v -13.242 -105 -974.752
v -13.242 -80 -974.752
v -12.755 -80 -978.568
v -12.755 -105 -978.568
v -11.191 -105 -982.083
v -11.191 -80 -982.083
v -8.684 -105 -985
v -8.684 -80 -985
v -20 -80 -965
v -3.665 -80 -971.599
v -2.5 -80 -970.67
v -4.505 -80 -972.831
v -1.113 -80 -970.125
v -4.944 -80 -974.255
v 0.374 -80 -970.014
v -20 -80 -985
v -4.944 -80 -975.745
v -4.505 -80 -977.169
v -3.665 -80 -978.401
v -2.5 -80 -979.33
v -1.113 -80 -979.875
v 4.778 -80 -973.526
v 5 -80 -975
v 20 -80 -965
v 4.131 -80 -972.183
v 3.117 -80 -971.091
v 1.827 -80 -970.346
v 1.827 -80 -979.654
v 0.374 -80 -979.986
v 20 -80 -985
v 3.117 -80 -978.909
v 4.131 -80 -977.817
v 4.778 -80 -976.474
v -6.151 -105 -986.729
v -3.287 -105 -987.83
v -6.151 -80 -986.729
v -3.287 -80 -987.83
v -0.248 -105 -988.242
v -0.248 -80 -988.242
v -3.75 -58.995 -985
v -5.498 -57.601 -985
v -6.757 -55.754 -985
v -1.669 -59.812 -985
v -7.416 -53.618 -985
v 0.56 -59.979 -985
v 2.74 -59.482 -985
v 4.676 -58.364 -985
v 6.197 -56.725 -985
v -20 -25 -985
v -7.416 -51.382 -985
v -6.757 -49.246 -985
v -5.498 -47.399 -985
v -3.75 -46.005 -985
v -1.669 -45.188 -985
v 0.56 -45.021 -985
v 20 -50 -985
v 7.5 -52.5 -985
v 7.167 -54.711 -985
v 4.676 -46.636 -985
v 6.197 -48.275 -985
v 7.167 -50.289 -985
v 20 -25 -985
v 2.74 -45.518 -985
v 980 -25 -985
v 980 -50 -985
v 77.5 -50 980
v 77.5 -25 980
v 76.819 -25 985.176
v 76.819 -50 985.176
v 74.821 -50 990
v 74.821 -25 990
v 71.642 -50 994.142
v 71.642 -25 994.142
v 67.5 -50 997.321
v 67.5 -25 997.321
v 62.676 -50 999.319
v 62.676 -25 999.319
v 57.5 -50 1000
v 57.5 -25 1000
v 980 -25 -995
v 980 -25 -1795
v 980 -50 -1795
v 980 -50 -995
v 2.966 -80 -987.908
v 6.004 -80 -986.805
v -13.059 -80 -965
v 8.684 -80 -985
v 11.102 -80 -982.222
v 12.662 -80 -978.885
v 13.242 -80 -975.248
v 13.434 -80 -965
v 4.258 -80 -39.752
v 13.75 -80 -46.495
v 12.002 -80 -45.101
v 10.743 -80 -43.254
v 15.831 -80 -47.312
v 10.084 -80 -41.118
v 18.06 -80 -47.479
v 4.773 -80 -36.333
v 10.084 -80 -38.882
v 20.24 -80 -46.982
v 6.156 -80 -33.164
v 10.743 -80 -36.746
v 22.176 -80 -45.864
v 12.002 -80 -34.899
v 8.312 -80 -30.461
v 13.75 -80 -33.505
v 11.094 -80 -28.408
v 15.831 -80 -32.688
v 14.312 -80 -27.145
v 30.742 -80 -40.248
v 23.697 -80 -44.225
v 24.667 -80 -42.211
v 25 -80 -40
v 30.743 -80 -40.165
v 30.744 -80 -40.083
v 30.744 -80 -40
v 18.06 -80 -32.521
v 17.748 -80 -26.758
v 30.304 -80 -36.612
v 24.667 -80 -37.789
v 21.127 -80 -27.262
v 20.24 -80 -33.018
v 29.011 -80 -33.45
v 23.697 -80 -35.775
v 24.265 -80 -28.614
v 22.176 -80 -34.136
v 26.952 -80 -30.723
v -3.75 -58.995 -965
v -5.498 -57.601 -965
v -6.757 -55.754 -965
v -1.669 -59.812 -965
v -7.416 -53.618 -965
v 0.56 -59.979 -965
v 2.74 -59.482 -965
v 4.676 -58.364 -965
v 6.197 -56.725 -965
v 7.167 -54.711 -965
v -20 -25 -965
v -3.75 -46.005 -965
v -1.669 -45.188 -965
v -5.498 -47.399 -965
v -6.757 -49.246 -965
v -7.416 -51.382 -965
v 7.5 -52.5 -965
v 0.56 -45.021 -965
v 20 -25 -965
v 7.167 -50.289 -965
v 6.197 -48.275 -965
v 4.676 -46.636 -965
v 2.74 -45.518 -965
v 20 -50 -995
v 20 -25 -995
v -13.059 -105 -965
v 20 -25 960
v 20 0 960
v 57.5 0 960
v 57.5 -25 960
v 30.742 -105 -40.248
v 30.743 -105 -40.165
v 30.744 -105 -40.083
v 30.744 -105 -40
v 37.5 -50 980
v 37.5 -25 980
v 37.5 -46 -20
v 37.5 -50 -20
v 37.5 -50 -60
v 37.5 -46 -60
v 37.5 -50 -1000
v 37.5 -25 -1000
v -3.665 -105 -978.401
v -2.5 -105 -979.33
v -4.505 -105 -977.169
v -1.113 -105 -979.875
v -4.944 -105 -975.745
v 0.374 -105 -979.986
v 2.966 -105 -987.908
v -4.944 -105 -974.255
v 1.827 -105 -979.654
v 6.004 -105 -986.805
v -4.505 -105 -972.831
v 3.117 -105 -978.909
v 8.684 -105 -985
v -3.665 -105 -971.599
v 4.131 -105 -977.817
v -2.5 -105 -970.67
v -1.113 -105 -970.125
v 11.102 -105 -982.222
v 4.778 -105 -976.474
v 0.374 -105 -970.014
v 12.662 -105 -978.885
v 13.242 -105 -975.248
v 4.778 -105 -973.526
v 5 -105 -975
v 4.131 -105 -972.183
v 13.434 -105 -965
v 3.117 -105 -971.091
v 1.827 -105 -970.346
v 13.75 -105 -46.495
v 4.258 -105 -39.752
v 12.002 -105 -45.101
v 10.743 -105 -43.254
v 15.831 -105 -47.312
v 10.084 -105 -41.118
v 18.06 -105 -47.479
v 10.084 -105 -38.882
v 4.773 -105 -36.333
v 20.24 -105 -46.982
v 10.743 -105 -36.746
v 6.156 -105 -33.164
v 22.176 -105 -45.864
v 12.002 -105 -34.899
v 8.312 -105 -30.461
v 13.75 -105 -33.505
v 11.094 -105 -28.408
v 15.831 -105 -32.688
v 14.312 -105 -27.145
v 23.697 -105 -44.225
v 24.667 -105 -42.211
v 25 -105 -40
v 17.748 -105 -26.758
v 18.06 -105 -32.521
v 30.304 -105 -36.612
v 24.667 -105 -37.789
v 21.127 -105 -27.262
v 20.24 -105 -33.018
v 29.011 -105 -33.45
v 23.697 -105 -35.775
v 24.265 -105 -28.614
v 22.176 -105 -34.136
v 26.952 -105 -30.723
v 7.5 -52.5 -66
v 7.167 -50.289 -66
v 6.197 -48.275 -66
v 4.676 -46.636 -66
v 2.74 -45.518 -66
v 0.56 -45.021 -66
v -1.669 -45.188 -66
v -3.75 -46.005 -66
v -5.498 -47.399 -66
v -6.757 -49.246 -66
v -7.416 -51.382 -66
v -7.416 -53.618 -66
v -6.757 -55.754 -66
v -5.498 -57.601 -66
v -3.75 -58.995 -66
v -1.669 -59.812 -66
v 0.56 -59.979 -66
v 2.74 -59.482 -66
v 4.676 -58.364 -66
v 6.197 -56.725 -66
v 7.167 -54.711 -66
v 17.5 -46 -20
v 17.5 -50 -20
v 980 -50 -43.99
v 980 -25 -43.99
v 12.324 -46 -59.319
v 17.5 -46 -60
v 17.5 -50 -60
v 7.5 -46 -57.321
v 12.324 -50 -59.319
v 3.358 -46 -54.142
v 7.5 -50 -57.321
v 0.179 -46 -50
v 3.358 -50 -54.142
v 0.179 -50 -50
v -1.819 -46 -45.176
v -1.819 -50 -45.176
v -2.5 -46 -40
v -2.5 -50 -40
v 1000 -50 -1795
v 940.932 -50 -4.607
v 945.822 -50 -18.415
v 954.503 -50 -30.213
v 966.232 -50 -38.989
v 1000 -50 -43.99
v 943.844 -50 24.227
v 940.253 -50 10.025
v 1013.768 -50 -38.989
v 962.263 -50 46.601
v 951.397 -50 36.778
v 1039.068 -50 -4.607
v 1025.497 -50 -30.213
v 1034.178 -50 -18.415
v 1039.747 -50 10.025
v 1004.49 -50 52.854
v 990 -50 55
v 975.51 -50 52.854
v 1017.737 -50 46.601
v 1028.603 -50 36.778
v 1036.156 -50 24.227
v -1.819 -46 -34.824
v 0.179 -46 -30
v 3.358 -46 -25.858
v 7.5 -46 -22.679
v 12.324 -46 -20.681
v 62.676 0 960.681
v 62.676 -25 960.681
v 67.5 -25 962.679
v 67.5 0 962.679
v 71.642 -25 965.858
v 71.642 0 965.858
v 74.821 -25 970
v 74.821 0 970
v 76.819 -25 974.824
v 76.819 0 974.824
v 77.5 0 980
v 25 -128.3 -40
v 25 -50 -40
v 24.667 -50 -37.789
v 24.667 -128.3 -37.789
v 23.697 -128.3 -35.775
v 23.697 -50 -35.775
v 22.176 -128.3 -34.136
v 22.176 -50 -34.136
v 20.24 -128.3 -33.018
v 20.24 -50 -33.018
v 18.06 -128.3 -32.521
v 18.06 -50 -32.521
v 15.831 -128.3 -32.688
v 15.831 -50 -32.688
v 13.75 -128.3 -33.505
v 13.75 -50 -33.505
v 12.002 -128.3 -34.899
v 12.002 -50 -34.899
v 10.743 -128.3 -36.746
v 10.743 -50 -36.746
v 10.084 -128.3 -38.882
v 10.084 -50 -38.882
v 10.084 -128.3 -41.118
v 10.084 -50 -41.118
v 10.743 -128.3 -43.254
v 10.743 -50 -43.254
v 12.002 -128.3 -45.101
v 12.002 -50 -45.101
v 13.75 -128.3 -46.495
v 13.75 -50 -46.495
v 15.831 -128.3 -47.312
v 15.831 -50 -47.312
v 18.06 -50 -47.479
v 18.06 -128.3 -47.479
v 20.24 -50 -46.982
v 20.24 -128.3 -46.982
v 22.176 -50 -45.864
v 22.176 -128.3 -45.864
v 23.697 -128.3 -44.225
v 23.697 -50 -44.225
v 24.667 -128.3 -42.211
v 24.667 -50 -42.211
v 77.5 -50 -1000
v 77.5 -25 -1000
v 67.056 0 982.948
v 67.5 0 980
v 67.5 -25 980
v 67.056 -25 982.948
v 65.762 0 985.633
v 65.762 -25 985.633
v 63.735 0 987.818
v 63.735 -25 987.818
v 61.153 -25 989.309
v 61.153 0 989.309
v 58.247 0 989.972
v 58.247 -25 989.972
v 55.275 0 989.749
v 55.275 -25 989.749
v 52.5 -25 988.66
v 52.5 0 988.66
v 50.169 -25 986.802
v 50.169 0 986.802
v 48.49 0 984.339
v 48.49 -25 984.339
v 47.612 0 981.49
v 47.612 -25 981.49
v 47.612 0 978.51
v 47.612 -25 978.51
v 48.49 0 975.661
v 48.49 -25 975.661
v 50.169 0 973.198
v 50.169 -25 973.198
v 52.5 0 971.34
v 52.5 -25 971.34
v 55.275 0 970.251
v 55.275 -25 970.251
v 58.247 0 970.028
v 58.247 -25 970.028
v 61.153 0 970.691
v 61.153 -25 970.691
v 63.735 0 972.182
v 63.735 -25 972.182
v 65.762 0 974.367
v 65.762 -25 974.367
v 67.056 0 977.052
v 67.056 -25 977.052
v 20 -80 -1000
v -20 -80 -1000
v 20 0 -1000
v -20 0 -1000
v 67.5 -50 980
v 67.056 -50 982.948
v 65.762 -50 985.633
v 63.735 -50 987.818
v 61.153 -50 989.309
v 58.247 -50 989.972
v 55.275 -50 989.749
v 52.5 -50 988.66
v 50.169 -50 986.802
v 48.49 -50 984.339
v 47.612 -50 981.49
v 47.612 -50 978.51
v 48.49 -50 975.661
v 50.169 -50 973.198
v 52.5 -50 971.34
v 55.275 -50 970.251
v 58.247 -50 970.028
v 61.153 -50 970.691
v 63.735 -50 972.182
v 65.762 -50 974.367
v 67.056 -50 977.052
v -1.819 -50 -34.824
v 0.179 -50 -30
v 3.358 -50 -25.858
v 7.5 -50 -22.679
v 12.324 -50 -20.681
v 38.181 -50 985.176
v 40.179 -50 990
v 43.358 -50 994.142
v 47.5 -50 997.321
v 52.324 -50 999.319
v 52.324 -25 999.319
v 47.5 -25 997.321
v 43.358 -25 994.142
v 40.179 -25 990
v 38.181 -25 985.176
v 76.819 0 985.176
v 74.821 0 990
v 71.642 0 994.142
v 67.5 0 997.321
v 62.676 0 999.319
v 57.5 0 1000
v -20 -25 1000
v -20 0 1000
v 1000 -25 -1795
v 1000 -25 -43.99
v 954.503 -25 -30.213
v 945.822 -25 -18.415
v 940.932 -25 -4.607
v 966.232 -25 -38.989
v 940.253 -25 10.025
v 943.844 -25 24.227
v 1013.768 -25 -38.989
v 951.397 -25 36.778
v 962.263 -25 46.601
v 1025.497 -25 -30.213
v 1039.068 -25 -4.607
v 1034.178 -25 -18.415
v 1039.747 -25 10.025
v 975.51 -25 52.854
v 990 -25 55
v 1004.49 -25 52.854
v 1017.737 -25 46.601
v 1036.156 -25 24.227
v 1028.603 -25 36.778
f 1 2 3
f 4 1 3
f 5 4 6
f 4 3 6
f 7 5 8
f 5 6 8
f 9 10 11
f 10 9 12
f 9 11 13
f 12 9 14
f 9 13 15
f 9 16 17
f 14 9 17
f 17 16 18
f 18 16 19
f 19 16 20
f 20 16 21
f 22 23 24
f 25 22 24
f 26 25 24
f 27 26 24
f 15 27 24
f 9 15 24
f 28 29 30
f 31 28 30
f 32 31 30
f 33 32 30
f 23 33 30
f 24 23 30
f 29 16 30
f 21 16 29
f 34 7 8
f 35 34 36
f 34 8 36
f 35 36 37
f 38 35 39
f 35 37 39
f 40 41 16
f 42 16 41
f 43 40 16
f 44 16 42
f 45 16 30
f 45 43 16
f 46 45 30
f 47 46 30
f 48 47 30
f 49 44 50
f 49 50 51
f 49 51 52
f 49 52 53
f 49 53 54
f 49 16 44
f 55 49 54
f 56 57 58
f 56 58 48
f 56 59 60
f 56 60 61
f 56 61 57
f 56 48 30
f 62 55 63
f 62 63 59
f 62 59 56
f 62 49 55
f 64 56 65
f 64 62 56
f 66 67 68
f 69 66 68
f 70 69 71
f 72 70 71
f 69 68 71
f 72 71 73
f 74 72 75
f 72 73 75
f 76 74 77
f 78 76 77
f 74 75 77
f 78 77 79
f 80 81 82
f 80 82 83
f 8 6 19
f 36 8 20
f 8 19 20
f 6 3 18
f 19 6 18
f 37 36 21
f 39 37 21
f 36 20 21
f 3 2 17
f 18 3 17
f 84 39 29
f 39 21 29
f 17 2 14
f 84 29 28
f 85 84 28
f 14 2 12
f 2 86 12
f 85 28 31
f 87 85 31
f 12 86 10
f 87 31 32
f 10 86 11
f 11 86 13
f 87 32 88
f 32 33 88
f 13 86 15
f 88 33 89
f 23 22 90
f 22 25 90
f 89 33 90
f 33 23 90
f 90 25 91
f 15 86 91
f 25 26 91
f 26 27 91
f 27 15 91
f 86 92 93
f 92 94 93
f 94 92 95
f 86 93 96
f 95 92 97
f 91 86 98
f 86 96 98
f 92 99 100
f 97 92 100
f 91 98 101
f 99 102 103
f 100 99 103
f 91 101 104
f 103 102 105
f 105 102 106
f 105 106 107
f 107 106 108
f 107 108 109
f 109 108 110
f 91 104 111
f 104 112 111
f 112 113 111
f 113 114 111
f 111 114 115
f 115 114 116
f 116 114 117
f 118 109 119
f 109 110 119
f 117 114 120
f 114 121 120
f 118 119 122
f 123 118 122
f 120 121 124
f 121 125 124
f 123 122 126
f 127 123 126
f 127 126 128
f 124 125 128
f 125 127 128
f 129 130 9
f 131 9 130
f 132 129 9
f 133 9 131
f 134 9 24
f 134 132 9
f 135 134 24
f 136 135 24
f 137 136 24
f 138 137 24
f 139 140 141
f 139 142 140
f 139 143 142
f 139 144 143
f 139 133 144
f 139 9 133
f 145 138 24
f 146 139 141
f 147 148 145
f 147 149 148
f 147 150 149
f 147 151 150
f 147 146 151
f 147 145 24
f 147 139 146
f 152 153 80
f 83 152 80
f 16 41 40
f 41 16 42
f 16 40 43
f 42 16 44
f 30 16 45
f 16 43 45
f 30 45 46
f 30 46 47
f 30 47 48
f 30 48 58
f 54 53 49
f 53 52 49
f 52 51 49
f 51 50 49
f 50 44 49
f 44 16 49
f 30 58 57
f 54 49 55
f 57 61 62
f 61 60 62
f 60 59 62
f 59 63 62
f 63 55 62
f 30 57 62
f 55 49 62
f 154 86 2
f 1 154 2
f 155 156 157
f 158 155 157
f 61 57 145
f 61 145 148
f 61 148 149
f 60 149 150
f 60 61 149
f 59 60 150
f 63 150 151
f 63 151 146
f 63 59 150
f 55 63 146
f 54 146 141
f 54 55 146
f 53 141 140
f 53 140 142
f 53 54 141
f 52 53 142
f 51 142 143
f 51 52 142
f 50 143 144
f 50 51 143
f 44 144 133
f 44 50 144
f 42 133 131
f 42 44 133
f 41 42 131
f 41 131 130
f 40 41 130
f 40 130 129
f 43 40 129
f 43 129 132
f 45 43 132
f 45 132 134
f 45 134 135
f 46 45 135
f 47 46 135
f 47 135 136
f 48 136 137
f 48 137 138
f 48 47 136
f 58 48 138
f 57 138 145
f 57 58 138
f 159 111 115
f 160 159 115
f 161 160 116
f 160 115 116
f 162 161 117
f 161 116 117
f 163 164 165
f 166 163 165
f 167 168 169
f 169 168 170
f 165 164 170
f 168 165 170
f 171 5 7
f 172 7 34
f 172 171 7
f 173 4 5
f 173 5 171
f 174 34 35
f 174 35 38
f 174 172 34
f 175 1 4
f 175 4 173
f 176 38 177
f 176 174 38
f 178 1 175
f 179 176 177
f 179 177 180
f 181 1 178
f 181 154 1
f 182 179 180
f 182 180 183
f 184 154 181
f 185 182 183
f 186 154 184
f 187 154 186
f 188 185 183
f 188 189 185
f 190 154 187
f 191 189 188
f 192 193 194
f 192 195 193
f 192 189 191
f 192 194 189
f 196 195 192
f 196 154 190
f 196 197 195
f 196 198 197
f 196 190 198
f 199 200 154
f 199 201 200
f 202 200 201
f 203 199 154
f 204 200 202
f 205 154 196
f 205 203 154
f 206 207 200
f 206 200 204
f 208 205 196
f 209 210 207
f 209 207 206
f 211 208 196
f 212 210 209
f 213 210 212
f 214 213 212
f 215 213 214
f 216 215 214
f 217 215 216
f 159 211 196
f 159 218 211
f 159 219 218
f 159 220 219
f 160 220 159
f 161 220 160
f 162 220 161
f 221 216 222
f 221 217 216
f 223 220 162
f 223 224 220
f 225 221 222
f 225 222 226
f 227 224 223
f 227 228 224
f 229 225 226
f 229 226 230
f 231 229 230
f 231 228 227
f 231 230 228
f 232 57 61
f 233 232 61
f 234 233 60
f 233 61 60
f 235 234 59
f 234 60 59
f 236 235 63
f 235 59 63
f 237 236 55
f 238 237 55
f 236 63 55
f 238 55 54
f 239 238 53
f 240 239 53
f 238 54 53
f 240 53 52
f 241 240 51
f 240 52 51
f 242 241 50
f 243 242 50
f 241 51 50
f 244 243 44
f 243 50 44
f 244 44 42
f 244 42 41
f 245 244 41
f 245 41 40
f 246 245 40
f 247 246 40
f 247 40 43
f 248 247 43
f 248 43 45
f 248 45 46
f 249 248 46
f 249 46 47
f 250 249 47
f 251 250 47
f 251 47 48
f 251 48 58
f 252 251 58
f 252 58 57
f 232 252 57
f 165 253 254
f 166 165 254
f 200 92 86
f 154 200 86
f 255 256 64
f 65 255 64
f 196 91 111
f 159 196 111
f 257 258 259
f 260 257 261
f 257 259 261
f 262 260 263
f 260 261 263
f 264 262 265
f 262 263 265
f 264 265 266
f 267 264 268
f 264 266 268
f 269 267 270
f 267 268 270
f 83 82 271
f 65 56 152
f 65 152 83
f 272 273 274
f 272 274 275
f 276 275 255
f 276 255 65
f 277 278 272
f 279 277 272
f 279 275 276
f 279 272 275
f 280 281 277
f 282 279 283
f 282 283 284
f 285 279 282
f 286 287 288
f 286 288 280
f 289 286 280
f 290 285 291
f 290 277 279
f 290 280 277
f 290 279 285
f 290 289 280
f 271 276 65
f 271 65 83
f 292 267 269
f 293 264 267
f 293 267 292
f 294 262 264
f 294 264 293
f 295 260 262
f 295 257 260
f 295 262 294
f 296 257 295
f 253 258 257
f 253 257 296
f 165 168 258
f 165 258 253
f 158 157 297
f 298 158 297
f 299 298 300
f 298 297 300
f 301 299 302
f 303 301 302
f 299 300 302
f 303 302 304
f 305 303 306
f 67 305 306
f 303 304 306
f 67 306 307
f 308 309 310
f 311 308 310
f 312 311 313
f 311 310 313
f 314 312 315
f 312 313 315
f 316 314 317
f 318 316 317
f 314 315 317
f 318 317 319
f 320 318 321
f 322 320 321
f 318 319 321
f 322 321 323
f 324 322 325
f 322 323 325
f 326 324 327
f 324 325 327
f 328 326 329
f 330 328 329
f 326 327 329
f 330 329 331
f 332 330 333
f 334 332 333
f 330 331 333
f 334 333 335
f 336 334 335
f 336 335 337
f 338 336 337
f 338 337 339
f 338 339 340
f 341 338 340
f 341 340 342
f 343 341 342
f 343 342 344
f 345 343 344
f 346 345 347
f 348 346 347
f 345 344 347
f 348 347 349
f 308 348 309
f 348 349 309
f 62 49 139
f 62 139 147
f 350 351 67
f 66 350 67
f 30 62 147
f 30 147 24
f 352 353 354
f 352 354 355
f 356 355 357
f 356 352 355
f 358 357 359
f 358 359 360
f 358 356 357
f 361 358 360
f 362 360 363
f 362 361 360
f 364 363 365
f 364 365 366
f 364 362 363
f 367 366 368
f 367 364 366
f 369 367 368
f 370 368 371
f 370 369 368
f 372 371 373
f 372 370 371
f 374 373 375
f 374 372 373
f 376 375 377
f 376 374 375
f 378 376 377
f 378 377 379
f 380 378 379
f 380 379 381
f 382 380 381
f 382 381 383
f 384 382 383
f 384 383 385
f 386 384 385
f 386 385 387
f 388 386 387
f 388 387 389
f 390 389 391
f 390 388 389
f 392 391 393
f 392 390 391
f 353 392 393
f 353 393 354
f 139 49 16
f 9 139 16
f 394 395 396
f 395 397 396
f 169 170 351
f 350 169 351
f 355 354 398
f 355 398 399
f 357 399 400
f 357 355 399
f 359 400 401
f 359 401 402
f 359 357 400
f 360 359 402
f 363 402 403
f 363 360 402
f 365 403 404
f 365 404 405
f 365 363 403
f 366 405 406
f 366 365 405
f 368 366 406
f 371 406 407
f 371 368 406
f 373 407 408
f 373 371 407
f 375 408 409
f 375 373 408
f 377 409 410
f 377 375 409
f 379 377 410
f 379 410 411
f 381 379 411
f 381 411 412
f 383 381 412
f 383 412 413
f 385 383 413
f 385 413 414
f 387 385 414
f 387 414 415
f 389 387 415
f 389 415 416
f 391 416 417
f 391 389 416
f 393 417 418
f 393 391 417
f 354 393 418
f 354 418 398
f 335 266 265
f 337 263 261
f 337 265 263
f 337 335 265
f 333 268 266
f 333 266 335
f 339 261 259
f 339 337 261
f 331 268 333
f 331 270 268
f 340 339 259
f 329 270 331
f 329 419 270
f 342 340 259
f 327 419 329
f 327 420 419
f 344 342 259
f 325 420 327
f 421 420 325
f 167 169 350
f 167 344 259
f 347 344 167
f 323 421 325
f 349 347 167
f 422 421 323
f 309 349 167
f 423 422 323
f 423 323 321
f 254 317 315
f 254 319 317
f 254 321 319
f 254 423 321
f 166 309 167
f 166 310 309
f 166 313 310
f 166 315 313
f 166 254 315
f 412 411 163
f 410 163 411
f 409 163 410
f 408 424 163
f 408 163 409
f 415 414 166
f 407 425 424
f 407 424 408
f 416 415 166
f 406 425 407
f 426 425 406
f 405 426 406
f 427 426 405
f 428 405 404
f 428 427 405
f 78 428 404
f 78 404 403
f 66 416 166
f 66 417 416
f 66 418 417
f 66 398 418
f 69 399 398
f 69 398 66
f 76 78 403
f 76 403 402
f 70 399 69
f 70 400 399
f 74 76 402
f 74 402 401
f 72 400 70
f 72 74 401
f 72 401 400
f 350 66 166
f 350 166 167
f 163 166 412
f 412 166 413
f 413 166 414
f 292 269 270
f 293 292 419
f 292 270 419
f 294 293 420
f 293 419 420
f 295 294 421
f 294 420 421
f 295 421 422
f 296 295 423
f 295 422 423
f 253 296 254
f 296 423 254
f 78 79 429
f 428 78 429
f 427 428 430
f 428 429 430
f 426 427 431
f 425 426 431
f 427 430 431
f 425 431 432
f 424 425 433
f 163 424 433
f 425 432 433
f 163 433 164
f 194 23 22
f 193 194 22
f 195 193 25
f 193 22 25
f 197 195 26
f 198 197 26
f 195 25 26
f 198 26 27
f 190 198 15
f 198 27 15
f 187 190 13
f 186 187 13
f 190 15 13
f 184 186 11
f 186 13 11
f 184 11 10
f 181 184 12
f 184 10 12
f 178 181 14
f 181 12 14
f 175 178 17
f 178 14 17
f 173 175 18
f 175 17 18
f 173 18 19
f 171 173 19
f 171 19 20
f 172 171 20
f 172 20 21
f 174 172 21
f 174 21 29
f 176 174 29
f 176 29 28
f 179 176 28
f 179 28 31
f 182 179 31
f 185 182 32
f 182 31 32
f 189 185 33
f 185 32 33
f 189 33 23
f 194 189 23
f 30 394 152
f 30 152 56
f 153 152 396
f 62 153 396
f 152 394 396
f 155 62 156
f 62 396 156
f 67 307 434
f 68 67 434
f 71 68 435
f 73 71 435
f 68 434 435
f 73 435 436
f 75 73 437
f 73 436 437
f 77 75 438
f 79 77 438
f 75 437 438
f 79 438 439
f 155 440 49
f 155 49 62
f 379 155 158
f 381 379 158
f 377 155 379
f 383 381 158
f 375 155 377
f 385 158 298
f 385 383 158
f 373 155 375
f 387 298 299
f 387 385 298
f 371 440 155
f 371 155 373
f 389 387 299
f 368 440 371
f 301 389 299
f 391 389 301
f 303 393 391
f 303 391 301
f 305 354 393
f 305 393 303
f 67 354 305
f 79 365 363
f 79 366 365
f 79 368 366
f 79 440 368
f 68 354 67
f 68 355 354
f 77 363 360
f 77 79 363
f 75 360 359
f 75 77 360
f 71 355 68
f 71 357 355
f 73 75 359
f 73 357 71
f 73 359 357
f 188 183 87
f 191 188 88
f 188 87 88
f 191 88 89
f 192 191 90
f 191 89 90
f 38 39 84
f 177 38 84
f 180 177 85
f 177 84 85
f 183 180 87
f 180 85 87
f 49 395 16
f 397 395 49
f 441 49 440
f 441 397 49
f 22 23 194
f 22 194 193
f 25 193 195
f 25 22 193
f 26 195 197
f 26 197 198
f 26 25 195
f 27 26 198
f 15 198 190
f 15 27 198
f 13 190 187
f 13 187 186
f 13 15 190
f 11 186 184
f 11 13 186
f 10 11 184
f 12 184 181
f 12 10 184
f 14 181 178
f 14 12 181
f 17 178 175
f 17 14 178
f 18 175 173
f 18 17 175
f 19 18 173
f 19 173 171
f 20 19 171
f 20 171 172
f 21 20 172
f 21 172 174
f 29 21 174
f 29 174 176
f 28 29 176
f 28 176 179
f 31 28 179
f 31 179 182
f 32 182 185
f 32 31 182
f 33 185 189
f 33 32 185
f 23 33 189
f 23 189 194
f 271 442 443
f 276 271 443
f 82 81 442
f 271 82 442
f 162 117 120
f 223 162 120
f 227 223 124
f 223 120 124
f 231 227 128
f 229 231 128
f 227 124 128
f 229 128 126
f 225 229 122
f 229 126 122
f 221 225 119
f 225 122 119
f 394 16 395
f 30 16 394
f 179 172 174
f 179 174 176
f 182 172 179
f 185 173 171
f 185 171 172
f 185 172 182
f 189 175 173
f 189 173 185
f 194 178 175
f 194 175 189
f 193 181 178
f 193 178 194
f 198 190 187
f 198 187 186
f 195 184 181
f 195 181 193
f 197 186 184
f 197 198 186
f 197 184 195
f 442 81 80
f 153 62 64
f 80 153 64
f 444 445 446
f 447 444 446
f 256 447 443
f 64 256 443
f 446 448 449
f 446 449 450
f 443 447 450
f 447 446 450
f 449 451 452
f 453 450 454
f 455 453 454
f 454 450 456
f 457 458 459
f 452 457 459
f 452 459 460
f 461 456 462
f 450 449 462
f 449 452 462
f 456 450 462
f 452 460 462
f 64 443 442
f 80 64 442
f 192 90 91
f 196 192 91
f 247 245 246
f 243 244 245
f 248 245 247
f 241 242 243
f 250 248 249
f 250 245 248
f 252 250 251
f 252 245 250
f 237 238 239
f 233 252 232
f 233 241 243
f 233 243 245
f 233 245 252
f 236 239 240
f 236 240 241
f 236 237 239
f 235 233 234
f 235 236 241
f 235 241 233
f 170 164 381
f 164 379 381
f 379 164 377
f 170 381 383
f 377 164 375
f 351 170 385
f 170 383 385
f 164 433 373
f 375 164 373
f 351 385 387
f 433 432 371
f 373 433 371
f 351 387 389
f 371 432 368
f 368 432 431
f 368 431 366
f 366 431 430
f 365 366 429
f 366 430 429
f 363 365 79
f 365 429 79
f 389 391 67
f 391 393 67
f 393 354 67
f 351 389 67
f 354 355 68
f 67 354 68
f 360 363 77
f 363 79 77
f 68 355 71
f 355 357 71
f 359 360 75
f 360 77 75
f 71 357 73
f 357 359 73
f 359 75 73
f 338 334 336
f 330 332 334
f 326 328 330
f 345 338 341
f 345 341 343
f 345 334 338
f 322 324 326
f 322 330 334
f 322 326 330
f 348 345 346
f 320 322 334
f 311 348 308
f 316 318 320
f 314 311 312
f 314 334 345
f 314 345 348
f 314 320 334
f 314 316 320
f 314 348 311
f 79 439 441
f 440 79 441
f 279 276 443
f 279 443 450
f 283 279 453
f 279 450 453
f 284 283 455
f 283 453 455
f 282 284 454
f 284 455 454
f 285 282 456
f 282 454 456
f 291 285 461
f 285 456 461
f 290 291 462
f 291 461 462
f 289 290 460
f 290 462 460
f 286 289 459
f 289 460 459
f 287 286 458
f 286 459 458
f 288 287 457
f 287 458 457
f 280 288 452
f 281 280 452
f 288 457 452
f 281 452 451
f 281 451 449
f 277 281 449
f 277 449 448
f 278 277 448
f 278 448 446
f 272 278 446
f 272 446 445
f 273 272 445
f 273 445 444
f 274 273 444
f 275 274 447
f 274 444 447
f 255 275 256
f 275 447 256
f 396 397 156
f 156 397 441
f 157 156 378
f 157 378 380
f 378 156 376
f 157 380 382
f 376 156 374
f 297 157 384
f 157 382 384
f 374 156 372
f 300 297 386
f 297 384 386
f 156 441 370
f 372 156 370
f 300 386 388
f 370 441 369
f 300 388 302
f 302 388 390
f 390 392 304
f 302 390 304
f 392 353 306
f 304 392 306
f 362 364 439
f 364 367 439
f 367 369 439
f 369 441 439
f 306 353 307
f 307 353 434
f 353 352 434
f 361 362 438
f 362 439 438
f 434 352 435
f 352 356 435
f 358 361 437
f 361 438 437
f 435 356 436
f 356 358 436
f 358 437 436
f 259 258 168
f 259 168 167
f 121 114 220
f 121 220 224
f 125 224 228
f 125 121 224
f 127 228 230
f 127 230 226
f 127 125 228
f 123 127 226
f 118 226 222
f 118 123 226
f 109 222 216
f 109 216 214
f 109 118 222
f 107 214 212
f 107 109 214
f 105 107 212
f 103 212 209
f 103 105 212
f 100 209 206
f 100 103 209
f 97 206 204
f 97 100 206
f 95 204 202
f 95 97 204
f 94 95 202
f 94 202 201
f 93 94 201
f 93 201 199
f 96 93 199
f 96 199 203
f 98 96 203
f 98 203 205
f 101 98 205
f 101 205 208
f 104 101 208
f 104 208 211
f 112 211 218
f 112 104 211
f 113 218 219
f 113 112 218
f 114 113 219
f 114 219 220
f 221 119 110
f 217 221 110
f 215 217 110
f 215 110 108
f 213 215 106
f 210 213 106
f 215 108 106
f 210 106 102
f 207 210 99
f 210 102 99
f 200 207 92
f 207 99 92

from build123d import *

# Parameters (mm, degrees)
F0_R      = 10
F1_DEPTH  = 25
F2_R      = 10
F3_DEPTH  = 25
F4_W      = 40
F4_H      = 15
F5_DEPTH  = 55
F6_W      = 4
F6_H      = 40
F7_DEPTH  = 40
F9_DEPTH  = 5
F10_R     = 7.5
F11_DEPTH = 919
F12_DEPTH = 20
F14_R     = 5
F14_R_2   = 7.5
F15_DEPTH = 25
F13_R     = 5
F16_DEPTH = 25
F8_R      = 7.5
F17_DEPTH = 78.3
F18_W     = 1000
F18_H     = 10
F18_W_2   = 20
F18_H_2   = 800
F19_DEPTH = 25


with BuildPart() as f1:
    # F0 (on Front) → F1 (new body)
    with BuildSketch(Plane.XZ):
        Polygon((20, 960), (20, 1000), (-20, 1000), (-20, -1000), (20, -1000), align=None)
        with BuildLine():
            Line((57.5, 1000), (20, 1000))
            Line((20, 1000), (20, 960))
            Line((20, 960), (57.5, 960))
            ThreePointArc((57.5, 960), (37.5, 980), (57.5, 1000))
        make_face()
        with BuildLine():
            ThreePointArc((77.5, 980), (71.6421356237, 994.1421356237), (57.5, 1000))
            ThreePointArc((57.5, 1000), (37.5, 980), (57.5, 960))
            ThreePointArc((57.5, 960), (71.6421356237, 965.8578643763), (77.5, 980))
        make_face()
        with Locations((57.5, 980)):
            Circle(F0_R, mode=Mode.SUBTRACT)
    extrude(amount=F1_DEPTH)

    # F4 (on face) → F5 (join)
    with BuildSketch(Plane.XZ.offset(25)):
        with Locations((0, -992.5)):
            Rectangle(F4_W, F4_H)
    extrude(amount=F5_DEPTH)

    # F10 (on face) → F11 (join)
    with BuildSketch(Plane.XY.offset(-985)):
        with Locations((0, -52.5)):
            Circle(F10_R)
    extrude(amount=F11_DEPTH)


with BuildPart() as f3:
    # F2 (on face) → F3 (new body)
    with BuildSketch(Plane.XZ.offset(25)):
        with BuildLine():
            Line((77.5, -1000), (77.5, 980))
            ThreePointArc((77.5, 980), (71.6421356237, 965.8578643763), (57.5, 960))
            Line((57.5, 960), (37.5, 960))
            Line((37.5, 960), (37.5, -1000))
            Line((37.5, -1000), (77.5, -1000))
        make_face()
        with BuildLine():
            ThreePointArc((77.5, 980), (71.6421356237, 994.1421356237), (57.5, 1000))
            ThreePointArc((57.5, 1000), (43.3578643763, 994.1421356237), (37.5, 980))
            ThreePointArc((37.5, 980), (43.3578643763, 965.8578643763), (57.5, 960))
            ThreePointArc((57.5, 960), (71.6421356237, 965.8578643763), (77.5, 980))
        make_face()
        with Locations((57.5, 980)):
            Circle(F2_R, mode=Mode.SUBTRACT)
        with BuildLine():
            ThreePointArc((57.5, 960), (43.3578643763, 965.8578643763), (37.5, 980))
            Line((37.5, 980), (37.5, 960))
            Line((37.5, 960), (57.5, 960))
        make_face()
    extrude(amount=F3_DEPTH)

    # F6 (on face) → F7 (join)
    with BuildSketch(Plane(origin=(37.5, 0, 0), x_dir=(0, -1, 0), z_dir=(-1, 0, 0))):
        with Locations((48, -40)):
            Rectangle(F6_W, F6_H)
    extrude(amount=F7_DEPTH)

    # F8 (on face) → F9 (cut)
    with BuildSketch(Plane.XZ.offset(50)):
        with BuildLine():
            ThreePointArc((-2.5, -40), (3.3578643763, -25.8578643763), (17.5, -20))
            Line((17.5, -20), (-2.5, -20))
            Line((-2.5, -20), (-2.5, -40))
        make_face()
        with BuildLine():
            Line((-2.5, -60), (17.5, -60))
            ThreePointArc((17.5, -60), (3.3578643763, -54.1421356237), (-2.5, -40))
            Line((-2.5, -40), (-2.5, -60))
        make_face()
    extrude(amount=-F9_DEPTH, mode=Mode.SUBTRACT)

    # F8 (on face) → F17 (join)
    with BuildSketch(Plane.XZ.offset(50)):
        with Locations((17.5, -40)):
            Circle(F8_R)
    extrude(amount=F17_DEPTH)


with BuildPart() as f12:
    # F12 (new): a face of the model
    f12_faces = [f1.part.faces().sort_by_distance(p)[0] for p in [
        (19.3199264746, -52.5, -985),
    ]]
    extrude(f12_faces, amount=F12_DEPTH)

    # F13 (on face) → F16 (join)
    with BuildSketch(Plane.XZ.offset(80)):
        with Locations((0, -975)):
            Circle(F13_R)
    extrude(amount=F16_DEPTH)


with BuildPart() as f15:
    # F14 (on face) → F15 (new body)
    with BuildSketch(Plane.XZ.offset(80)):
        with BuildLine():
            Line((-8.6838635851, -965), (8.6838635851, -965))
            ThreePointArc((8.6838635851, -965), (0, -961.755775343), (-8.6838635851, -965))
        make_face()
        with BuildLine():
            Line((13.2419054738, -975.2478430705), (13.4337100232, -965))
            Line((13.4337100232, -965), (8.6838635851, -965))
            ThreePointArc((8.6838635851, -965), (12.0503221321, -969.5046180045), (13.244224657, -975))
            ThreePointArc((13.244224657, -975), (13.2436448485, -975.1239269605), (13.2419054738, -975.2478430705))
        make_face()
        with BuildLine():
            Line((-8.6838635851, -965), (-13.0593784724, -965))
            Line((-13.0593784724, -965), (-13.2419052476, -974.7521448442))
            ThreePointArc((-13.2419052476, -974.7521448442), (-11.9983714308, -969.3920975603), (-8.6838635851, -965))
        make_face()
        with BuildLine():
            ThreePointArc((-0.2478435243, -988.2419054653), (4.5187494263, -987.4495136606), (8.6838635851, -985))
            Line((8.6838635851, -985), (-8.6838635851, -985))
            ThreePointArc((-8.6838635851, -985), (-4.7509299861, -987.3627727889), (-0.2478435243, -988.2419054653))
        make_face()
        with BuildLine():
            Line((13.4337100232, -965), (30.7419054788, -40.2478428035))
            ThreePointArc((30.7419054788, -40.2478428035), (17.2521509276, -53.2419053614), (4.2580947559, -39.7521446587))
            Line((4.2580947559, -39.7521446587), (-13.0593784724, -965))
            Line((-13.0593784724, -965), (-8.6838635851, -965))
            ThreePointArc((-8.6838635851, -965), (0, -961.755775343), (8.6838635851, -965))
            Line((8.6838635851, -965), (13.4337100232, -965))
        make_face()
        with BuildLine():
            ThreePointArc((8.6838635851, -985), (11.9983739898, -980.6078969645), (13.2419054738, -975.2478430705))
            ThreePointArc((13.2419054738, -975.2478430705), (13.2436448485, -975.1239269605), (13.244224657, -975))
            ThreePointArc((13.244224657, -975), (12.0503221321, -969.5046180045), (8.6838635851, -965))
            Line((8.6838635851, -965), (-8.6838635851, -965))
            ThreePointArc((-8.6838635851, -965), (-11.9983714308, -969.3920975603), (-13.2419052476, -974.7521448442))
            ThreePointArc((-13.2419052476, -974.7521448442), (-12.1012176474, -980.3823803484), (-8.6838635851, -985))
            Line((-8.6838635851, -985), (8.6838635851, -985))
        make_face()
        with Locations((0, -975)):
            Circle(F14_R, mode=Mode.SUBTRACT)
        with BuildLine():
            ThreePointArc((4.2580947559, -39.7521446587), (17.2521509276, -53.2419053614), (30.7419054788, -40.2478428035))
            ThreePointArc((30.7419054788, -40.2478428035), (30.7436448497, -40.1239268271), (30.744224657, -40))
            ThreePointArc((30.744224657, -40), (26.9523000332, -30.7229578611), (17.7478412406, -26.758094492))
            ThreePointArc((17.7478412406, -26.758094492), (8.31181412, -30.4613037055), (4.2580947559, -39.7521446587))
        make_face()
        with Locations((17.5, -40)):
            Circle(F14_R_2, mode=Mode.SUBTRACT)
    extrude(amount=F15_DEPTH)


with BuildPart() as f1_1:
    add(f1.part)

    # F18 (on face) → F19 (join)
    with BuildSketch(Plane.XZ.offset(25)):
        with Locations((480, -990)):
            Rectangle(F18_W, F18_H)
        with Locations((990, -990)):
            Rectangle(F18_W_2, F18_H)
        with BuildLine():
            Line((980, -43.9897948557), (980, -985))
            Line((980, -985), (1000, -985))
            Line((1000, -985), (1000, -43.9897948557))
            ThreePointArc((1000, -43.9897948557), (990, -45), (980, -43.9897948557))
        make_face()
        with Locations((990, -1395)):
            Rectangle(F18_W_2, F18_H_2)
        with BuildLine():
            ThreePointArc((1040, 5), (958.3772233983, 43.7298334621), (980, -43.9897948557))
            Line((980, -43.9897948557), (980, 5))
            Line((980, 5), (1000, 5))
            Line((1000, 5), (1000, -43.9897948557))
            ThreePointArc((1000, -43.9897948557), (1028.7298334621, -26.6227766017), (1040, 5))
        make_face()
        with BuildLine():
            Line((980, 5), (980, -43.9897948557))
            ThreePointArc((980, -43.9897948557), (990, -45), (1000, -43.9897948557))
            Line((1000, -43.9897948557), (1000, 5))
            Line((1000, 5), (980, 5))
        make_face()
    extrude(amount=F19_DEPTH)


solid = Compound([f3.part, f12.part, f15.part, f1_1.part])
